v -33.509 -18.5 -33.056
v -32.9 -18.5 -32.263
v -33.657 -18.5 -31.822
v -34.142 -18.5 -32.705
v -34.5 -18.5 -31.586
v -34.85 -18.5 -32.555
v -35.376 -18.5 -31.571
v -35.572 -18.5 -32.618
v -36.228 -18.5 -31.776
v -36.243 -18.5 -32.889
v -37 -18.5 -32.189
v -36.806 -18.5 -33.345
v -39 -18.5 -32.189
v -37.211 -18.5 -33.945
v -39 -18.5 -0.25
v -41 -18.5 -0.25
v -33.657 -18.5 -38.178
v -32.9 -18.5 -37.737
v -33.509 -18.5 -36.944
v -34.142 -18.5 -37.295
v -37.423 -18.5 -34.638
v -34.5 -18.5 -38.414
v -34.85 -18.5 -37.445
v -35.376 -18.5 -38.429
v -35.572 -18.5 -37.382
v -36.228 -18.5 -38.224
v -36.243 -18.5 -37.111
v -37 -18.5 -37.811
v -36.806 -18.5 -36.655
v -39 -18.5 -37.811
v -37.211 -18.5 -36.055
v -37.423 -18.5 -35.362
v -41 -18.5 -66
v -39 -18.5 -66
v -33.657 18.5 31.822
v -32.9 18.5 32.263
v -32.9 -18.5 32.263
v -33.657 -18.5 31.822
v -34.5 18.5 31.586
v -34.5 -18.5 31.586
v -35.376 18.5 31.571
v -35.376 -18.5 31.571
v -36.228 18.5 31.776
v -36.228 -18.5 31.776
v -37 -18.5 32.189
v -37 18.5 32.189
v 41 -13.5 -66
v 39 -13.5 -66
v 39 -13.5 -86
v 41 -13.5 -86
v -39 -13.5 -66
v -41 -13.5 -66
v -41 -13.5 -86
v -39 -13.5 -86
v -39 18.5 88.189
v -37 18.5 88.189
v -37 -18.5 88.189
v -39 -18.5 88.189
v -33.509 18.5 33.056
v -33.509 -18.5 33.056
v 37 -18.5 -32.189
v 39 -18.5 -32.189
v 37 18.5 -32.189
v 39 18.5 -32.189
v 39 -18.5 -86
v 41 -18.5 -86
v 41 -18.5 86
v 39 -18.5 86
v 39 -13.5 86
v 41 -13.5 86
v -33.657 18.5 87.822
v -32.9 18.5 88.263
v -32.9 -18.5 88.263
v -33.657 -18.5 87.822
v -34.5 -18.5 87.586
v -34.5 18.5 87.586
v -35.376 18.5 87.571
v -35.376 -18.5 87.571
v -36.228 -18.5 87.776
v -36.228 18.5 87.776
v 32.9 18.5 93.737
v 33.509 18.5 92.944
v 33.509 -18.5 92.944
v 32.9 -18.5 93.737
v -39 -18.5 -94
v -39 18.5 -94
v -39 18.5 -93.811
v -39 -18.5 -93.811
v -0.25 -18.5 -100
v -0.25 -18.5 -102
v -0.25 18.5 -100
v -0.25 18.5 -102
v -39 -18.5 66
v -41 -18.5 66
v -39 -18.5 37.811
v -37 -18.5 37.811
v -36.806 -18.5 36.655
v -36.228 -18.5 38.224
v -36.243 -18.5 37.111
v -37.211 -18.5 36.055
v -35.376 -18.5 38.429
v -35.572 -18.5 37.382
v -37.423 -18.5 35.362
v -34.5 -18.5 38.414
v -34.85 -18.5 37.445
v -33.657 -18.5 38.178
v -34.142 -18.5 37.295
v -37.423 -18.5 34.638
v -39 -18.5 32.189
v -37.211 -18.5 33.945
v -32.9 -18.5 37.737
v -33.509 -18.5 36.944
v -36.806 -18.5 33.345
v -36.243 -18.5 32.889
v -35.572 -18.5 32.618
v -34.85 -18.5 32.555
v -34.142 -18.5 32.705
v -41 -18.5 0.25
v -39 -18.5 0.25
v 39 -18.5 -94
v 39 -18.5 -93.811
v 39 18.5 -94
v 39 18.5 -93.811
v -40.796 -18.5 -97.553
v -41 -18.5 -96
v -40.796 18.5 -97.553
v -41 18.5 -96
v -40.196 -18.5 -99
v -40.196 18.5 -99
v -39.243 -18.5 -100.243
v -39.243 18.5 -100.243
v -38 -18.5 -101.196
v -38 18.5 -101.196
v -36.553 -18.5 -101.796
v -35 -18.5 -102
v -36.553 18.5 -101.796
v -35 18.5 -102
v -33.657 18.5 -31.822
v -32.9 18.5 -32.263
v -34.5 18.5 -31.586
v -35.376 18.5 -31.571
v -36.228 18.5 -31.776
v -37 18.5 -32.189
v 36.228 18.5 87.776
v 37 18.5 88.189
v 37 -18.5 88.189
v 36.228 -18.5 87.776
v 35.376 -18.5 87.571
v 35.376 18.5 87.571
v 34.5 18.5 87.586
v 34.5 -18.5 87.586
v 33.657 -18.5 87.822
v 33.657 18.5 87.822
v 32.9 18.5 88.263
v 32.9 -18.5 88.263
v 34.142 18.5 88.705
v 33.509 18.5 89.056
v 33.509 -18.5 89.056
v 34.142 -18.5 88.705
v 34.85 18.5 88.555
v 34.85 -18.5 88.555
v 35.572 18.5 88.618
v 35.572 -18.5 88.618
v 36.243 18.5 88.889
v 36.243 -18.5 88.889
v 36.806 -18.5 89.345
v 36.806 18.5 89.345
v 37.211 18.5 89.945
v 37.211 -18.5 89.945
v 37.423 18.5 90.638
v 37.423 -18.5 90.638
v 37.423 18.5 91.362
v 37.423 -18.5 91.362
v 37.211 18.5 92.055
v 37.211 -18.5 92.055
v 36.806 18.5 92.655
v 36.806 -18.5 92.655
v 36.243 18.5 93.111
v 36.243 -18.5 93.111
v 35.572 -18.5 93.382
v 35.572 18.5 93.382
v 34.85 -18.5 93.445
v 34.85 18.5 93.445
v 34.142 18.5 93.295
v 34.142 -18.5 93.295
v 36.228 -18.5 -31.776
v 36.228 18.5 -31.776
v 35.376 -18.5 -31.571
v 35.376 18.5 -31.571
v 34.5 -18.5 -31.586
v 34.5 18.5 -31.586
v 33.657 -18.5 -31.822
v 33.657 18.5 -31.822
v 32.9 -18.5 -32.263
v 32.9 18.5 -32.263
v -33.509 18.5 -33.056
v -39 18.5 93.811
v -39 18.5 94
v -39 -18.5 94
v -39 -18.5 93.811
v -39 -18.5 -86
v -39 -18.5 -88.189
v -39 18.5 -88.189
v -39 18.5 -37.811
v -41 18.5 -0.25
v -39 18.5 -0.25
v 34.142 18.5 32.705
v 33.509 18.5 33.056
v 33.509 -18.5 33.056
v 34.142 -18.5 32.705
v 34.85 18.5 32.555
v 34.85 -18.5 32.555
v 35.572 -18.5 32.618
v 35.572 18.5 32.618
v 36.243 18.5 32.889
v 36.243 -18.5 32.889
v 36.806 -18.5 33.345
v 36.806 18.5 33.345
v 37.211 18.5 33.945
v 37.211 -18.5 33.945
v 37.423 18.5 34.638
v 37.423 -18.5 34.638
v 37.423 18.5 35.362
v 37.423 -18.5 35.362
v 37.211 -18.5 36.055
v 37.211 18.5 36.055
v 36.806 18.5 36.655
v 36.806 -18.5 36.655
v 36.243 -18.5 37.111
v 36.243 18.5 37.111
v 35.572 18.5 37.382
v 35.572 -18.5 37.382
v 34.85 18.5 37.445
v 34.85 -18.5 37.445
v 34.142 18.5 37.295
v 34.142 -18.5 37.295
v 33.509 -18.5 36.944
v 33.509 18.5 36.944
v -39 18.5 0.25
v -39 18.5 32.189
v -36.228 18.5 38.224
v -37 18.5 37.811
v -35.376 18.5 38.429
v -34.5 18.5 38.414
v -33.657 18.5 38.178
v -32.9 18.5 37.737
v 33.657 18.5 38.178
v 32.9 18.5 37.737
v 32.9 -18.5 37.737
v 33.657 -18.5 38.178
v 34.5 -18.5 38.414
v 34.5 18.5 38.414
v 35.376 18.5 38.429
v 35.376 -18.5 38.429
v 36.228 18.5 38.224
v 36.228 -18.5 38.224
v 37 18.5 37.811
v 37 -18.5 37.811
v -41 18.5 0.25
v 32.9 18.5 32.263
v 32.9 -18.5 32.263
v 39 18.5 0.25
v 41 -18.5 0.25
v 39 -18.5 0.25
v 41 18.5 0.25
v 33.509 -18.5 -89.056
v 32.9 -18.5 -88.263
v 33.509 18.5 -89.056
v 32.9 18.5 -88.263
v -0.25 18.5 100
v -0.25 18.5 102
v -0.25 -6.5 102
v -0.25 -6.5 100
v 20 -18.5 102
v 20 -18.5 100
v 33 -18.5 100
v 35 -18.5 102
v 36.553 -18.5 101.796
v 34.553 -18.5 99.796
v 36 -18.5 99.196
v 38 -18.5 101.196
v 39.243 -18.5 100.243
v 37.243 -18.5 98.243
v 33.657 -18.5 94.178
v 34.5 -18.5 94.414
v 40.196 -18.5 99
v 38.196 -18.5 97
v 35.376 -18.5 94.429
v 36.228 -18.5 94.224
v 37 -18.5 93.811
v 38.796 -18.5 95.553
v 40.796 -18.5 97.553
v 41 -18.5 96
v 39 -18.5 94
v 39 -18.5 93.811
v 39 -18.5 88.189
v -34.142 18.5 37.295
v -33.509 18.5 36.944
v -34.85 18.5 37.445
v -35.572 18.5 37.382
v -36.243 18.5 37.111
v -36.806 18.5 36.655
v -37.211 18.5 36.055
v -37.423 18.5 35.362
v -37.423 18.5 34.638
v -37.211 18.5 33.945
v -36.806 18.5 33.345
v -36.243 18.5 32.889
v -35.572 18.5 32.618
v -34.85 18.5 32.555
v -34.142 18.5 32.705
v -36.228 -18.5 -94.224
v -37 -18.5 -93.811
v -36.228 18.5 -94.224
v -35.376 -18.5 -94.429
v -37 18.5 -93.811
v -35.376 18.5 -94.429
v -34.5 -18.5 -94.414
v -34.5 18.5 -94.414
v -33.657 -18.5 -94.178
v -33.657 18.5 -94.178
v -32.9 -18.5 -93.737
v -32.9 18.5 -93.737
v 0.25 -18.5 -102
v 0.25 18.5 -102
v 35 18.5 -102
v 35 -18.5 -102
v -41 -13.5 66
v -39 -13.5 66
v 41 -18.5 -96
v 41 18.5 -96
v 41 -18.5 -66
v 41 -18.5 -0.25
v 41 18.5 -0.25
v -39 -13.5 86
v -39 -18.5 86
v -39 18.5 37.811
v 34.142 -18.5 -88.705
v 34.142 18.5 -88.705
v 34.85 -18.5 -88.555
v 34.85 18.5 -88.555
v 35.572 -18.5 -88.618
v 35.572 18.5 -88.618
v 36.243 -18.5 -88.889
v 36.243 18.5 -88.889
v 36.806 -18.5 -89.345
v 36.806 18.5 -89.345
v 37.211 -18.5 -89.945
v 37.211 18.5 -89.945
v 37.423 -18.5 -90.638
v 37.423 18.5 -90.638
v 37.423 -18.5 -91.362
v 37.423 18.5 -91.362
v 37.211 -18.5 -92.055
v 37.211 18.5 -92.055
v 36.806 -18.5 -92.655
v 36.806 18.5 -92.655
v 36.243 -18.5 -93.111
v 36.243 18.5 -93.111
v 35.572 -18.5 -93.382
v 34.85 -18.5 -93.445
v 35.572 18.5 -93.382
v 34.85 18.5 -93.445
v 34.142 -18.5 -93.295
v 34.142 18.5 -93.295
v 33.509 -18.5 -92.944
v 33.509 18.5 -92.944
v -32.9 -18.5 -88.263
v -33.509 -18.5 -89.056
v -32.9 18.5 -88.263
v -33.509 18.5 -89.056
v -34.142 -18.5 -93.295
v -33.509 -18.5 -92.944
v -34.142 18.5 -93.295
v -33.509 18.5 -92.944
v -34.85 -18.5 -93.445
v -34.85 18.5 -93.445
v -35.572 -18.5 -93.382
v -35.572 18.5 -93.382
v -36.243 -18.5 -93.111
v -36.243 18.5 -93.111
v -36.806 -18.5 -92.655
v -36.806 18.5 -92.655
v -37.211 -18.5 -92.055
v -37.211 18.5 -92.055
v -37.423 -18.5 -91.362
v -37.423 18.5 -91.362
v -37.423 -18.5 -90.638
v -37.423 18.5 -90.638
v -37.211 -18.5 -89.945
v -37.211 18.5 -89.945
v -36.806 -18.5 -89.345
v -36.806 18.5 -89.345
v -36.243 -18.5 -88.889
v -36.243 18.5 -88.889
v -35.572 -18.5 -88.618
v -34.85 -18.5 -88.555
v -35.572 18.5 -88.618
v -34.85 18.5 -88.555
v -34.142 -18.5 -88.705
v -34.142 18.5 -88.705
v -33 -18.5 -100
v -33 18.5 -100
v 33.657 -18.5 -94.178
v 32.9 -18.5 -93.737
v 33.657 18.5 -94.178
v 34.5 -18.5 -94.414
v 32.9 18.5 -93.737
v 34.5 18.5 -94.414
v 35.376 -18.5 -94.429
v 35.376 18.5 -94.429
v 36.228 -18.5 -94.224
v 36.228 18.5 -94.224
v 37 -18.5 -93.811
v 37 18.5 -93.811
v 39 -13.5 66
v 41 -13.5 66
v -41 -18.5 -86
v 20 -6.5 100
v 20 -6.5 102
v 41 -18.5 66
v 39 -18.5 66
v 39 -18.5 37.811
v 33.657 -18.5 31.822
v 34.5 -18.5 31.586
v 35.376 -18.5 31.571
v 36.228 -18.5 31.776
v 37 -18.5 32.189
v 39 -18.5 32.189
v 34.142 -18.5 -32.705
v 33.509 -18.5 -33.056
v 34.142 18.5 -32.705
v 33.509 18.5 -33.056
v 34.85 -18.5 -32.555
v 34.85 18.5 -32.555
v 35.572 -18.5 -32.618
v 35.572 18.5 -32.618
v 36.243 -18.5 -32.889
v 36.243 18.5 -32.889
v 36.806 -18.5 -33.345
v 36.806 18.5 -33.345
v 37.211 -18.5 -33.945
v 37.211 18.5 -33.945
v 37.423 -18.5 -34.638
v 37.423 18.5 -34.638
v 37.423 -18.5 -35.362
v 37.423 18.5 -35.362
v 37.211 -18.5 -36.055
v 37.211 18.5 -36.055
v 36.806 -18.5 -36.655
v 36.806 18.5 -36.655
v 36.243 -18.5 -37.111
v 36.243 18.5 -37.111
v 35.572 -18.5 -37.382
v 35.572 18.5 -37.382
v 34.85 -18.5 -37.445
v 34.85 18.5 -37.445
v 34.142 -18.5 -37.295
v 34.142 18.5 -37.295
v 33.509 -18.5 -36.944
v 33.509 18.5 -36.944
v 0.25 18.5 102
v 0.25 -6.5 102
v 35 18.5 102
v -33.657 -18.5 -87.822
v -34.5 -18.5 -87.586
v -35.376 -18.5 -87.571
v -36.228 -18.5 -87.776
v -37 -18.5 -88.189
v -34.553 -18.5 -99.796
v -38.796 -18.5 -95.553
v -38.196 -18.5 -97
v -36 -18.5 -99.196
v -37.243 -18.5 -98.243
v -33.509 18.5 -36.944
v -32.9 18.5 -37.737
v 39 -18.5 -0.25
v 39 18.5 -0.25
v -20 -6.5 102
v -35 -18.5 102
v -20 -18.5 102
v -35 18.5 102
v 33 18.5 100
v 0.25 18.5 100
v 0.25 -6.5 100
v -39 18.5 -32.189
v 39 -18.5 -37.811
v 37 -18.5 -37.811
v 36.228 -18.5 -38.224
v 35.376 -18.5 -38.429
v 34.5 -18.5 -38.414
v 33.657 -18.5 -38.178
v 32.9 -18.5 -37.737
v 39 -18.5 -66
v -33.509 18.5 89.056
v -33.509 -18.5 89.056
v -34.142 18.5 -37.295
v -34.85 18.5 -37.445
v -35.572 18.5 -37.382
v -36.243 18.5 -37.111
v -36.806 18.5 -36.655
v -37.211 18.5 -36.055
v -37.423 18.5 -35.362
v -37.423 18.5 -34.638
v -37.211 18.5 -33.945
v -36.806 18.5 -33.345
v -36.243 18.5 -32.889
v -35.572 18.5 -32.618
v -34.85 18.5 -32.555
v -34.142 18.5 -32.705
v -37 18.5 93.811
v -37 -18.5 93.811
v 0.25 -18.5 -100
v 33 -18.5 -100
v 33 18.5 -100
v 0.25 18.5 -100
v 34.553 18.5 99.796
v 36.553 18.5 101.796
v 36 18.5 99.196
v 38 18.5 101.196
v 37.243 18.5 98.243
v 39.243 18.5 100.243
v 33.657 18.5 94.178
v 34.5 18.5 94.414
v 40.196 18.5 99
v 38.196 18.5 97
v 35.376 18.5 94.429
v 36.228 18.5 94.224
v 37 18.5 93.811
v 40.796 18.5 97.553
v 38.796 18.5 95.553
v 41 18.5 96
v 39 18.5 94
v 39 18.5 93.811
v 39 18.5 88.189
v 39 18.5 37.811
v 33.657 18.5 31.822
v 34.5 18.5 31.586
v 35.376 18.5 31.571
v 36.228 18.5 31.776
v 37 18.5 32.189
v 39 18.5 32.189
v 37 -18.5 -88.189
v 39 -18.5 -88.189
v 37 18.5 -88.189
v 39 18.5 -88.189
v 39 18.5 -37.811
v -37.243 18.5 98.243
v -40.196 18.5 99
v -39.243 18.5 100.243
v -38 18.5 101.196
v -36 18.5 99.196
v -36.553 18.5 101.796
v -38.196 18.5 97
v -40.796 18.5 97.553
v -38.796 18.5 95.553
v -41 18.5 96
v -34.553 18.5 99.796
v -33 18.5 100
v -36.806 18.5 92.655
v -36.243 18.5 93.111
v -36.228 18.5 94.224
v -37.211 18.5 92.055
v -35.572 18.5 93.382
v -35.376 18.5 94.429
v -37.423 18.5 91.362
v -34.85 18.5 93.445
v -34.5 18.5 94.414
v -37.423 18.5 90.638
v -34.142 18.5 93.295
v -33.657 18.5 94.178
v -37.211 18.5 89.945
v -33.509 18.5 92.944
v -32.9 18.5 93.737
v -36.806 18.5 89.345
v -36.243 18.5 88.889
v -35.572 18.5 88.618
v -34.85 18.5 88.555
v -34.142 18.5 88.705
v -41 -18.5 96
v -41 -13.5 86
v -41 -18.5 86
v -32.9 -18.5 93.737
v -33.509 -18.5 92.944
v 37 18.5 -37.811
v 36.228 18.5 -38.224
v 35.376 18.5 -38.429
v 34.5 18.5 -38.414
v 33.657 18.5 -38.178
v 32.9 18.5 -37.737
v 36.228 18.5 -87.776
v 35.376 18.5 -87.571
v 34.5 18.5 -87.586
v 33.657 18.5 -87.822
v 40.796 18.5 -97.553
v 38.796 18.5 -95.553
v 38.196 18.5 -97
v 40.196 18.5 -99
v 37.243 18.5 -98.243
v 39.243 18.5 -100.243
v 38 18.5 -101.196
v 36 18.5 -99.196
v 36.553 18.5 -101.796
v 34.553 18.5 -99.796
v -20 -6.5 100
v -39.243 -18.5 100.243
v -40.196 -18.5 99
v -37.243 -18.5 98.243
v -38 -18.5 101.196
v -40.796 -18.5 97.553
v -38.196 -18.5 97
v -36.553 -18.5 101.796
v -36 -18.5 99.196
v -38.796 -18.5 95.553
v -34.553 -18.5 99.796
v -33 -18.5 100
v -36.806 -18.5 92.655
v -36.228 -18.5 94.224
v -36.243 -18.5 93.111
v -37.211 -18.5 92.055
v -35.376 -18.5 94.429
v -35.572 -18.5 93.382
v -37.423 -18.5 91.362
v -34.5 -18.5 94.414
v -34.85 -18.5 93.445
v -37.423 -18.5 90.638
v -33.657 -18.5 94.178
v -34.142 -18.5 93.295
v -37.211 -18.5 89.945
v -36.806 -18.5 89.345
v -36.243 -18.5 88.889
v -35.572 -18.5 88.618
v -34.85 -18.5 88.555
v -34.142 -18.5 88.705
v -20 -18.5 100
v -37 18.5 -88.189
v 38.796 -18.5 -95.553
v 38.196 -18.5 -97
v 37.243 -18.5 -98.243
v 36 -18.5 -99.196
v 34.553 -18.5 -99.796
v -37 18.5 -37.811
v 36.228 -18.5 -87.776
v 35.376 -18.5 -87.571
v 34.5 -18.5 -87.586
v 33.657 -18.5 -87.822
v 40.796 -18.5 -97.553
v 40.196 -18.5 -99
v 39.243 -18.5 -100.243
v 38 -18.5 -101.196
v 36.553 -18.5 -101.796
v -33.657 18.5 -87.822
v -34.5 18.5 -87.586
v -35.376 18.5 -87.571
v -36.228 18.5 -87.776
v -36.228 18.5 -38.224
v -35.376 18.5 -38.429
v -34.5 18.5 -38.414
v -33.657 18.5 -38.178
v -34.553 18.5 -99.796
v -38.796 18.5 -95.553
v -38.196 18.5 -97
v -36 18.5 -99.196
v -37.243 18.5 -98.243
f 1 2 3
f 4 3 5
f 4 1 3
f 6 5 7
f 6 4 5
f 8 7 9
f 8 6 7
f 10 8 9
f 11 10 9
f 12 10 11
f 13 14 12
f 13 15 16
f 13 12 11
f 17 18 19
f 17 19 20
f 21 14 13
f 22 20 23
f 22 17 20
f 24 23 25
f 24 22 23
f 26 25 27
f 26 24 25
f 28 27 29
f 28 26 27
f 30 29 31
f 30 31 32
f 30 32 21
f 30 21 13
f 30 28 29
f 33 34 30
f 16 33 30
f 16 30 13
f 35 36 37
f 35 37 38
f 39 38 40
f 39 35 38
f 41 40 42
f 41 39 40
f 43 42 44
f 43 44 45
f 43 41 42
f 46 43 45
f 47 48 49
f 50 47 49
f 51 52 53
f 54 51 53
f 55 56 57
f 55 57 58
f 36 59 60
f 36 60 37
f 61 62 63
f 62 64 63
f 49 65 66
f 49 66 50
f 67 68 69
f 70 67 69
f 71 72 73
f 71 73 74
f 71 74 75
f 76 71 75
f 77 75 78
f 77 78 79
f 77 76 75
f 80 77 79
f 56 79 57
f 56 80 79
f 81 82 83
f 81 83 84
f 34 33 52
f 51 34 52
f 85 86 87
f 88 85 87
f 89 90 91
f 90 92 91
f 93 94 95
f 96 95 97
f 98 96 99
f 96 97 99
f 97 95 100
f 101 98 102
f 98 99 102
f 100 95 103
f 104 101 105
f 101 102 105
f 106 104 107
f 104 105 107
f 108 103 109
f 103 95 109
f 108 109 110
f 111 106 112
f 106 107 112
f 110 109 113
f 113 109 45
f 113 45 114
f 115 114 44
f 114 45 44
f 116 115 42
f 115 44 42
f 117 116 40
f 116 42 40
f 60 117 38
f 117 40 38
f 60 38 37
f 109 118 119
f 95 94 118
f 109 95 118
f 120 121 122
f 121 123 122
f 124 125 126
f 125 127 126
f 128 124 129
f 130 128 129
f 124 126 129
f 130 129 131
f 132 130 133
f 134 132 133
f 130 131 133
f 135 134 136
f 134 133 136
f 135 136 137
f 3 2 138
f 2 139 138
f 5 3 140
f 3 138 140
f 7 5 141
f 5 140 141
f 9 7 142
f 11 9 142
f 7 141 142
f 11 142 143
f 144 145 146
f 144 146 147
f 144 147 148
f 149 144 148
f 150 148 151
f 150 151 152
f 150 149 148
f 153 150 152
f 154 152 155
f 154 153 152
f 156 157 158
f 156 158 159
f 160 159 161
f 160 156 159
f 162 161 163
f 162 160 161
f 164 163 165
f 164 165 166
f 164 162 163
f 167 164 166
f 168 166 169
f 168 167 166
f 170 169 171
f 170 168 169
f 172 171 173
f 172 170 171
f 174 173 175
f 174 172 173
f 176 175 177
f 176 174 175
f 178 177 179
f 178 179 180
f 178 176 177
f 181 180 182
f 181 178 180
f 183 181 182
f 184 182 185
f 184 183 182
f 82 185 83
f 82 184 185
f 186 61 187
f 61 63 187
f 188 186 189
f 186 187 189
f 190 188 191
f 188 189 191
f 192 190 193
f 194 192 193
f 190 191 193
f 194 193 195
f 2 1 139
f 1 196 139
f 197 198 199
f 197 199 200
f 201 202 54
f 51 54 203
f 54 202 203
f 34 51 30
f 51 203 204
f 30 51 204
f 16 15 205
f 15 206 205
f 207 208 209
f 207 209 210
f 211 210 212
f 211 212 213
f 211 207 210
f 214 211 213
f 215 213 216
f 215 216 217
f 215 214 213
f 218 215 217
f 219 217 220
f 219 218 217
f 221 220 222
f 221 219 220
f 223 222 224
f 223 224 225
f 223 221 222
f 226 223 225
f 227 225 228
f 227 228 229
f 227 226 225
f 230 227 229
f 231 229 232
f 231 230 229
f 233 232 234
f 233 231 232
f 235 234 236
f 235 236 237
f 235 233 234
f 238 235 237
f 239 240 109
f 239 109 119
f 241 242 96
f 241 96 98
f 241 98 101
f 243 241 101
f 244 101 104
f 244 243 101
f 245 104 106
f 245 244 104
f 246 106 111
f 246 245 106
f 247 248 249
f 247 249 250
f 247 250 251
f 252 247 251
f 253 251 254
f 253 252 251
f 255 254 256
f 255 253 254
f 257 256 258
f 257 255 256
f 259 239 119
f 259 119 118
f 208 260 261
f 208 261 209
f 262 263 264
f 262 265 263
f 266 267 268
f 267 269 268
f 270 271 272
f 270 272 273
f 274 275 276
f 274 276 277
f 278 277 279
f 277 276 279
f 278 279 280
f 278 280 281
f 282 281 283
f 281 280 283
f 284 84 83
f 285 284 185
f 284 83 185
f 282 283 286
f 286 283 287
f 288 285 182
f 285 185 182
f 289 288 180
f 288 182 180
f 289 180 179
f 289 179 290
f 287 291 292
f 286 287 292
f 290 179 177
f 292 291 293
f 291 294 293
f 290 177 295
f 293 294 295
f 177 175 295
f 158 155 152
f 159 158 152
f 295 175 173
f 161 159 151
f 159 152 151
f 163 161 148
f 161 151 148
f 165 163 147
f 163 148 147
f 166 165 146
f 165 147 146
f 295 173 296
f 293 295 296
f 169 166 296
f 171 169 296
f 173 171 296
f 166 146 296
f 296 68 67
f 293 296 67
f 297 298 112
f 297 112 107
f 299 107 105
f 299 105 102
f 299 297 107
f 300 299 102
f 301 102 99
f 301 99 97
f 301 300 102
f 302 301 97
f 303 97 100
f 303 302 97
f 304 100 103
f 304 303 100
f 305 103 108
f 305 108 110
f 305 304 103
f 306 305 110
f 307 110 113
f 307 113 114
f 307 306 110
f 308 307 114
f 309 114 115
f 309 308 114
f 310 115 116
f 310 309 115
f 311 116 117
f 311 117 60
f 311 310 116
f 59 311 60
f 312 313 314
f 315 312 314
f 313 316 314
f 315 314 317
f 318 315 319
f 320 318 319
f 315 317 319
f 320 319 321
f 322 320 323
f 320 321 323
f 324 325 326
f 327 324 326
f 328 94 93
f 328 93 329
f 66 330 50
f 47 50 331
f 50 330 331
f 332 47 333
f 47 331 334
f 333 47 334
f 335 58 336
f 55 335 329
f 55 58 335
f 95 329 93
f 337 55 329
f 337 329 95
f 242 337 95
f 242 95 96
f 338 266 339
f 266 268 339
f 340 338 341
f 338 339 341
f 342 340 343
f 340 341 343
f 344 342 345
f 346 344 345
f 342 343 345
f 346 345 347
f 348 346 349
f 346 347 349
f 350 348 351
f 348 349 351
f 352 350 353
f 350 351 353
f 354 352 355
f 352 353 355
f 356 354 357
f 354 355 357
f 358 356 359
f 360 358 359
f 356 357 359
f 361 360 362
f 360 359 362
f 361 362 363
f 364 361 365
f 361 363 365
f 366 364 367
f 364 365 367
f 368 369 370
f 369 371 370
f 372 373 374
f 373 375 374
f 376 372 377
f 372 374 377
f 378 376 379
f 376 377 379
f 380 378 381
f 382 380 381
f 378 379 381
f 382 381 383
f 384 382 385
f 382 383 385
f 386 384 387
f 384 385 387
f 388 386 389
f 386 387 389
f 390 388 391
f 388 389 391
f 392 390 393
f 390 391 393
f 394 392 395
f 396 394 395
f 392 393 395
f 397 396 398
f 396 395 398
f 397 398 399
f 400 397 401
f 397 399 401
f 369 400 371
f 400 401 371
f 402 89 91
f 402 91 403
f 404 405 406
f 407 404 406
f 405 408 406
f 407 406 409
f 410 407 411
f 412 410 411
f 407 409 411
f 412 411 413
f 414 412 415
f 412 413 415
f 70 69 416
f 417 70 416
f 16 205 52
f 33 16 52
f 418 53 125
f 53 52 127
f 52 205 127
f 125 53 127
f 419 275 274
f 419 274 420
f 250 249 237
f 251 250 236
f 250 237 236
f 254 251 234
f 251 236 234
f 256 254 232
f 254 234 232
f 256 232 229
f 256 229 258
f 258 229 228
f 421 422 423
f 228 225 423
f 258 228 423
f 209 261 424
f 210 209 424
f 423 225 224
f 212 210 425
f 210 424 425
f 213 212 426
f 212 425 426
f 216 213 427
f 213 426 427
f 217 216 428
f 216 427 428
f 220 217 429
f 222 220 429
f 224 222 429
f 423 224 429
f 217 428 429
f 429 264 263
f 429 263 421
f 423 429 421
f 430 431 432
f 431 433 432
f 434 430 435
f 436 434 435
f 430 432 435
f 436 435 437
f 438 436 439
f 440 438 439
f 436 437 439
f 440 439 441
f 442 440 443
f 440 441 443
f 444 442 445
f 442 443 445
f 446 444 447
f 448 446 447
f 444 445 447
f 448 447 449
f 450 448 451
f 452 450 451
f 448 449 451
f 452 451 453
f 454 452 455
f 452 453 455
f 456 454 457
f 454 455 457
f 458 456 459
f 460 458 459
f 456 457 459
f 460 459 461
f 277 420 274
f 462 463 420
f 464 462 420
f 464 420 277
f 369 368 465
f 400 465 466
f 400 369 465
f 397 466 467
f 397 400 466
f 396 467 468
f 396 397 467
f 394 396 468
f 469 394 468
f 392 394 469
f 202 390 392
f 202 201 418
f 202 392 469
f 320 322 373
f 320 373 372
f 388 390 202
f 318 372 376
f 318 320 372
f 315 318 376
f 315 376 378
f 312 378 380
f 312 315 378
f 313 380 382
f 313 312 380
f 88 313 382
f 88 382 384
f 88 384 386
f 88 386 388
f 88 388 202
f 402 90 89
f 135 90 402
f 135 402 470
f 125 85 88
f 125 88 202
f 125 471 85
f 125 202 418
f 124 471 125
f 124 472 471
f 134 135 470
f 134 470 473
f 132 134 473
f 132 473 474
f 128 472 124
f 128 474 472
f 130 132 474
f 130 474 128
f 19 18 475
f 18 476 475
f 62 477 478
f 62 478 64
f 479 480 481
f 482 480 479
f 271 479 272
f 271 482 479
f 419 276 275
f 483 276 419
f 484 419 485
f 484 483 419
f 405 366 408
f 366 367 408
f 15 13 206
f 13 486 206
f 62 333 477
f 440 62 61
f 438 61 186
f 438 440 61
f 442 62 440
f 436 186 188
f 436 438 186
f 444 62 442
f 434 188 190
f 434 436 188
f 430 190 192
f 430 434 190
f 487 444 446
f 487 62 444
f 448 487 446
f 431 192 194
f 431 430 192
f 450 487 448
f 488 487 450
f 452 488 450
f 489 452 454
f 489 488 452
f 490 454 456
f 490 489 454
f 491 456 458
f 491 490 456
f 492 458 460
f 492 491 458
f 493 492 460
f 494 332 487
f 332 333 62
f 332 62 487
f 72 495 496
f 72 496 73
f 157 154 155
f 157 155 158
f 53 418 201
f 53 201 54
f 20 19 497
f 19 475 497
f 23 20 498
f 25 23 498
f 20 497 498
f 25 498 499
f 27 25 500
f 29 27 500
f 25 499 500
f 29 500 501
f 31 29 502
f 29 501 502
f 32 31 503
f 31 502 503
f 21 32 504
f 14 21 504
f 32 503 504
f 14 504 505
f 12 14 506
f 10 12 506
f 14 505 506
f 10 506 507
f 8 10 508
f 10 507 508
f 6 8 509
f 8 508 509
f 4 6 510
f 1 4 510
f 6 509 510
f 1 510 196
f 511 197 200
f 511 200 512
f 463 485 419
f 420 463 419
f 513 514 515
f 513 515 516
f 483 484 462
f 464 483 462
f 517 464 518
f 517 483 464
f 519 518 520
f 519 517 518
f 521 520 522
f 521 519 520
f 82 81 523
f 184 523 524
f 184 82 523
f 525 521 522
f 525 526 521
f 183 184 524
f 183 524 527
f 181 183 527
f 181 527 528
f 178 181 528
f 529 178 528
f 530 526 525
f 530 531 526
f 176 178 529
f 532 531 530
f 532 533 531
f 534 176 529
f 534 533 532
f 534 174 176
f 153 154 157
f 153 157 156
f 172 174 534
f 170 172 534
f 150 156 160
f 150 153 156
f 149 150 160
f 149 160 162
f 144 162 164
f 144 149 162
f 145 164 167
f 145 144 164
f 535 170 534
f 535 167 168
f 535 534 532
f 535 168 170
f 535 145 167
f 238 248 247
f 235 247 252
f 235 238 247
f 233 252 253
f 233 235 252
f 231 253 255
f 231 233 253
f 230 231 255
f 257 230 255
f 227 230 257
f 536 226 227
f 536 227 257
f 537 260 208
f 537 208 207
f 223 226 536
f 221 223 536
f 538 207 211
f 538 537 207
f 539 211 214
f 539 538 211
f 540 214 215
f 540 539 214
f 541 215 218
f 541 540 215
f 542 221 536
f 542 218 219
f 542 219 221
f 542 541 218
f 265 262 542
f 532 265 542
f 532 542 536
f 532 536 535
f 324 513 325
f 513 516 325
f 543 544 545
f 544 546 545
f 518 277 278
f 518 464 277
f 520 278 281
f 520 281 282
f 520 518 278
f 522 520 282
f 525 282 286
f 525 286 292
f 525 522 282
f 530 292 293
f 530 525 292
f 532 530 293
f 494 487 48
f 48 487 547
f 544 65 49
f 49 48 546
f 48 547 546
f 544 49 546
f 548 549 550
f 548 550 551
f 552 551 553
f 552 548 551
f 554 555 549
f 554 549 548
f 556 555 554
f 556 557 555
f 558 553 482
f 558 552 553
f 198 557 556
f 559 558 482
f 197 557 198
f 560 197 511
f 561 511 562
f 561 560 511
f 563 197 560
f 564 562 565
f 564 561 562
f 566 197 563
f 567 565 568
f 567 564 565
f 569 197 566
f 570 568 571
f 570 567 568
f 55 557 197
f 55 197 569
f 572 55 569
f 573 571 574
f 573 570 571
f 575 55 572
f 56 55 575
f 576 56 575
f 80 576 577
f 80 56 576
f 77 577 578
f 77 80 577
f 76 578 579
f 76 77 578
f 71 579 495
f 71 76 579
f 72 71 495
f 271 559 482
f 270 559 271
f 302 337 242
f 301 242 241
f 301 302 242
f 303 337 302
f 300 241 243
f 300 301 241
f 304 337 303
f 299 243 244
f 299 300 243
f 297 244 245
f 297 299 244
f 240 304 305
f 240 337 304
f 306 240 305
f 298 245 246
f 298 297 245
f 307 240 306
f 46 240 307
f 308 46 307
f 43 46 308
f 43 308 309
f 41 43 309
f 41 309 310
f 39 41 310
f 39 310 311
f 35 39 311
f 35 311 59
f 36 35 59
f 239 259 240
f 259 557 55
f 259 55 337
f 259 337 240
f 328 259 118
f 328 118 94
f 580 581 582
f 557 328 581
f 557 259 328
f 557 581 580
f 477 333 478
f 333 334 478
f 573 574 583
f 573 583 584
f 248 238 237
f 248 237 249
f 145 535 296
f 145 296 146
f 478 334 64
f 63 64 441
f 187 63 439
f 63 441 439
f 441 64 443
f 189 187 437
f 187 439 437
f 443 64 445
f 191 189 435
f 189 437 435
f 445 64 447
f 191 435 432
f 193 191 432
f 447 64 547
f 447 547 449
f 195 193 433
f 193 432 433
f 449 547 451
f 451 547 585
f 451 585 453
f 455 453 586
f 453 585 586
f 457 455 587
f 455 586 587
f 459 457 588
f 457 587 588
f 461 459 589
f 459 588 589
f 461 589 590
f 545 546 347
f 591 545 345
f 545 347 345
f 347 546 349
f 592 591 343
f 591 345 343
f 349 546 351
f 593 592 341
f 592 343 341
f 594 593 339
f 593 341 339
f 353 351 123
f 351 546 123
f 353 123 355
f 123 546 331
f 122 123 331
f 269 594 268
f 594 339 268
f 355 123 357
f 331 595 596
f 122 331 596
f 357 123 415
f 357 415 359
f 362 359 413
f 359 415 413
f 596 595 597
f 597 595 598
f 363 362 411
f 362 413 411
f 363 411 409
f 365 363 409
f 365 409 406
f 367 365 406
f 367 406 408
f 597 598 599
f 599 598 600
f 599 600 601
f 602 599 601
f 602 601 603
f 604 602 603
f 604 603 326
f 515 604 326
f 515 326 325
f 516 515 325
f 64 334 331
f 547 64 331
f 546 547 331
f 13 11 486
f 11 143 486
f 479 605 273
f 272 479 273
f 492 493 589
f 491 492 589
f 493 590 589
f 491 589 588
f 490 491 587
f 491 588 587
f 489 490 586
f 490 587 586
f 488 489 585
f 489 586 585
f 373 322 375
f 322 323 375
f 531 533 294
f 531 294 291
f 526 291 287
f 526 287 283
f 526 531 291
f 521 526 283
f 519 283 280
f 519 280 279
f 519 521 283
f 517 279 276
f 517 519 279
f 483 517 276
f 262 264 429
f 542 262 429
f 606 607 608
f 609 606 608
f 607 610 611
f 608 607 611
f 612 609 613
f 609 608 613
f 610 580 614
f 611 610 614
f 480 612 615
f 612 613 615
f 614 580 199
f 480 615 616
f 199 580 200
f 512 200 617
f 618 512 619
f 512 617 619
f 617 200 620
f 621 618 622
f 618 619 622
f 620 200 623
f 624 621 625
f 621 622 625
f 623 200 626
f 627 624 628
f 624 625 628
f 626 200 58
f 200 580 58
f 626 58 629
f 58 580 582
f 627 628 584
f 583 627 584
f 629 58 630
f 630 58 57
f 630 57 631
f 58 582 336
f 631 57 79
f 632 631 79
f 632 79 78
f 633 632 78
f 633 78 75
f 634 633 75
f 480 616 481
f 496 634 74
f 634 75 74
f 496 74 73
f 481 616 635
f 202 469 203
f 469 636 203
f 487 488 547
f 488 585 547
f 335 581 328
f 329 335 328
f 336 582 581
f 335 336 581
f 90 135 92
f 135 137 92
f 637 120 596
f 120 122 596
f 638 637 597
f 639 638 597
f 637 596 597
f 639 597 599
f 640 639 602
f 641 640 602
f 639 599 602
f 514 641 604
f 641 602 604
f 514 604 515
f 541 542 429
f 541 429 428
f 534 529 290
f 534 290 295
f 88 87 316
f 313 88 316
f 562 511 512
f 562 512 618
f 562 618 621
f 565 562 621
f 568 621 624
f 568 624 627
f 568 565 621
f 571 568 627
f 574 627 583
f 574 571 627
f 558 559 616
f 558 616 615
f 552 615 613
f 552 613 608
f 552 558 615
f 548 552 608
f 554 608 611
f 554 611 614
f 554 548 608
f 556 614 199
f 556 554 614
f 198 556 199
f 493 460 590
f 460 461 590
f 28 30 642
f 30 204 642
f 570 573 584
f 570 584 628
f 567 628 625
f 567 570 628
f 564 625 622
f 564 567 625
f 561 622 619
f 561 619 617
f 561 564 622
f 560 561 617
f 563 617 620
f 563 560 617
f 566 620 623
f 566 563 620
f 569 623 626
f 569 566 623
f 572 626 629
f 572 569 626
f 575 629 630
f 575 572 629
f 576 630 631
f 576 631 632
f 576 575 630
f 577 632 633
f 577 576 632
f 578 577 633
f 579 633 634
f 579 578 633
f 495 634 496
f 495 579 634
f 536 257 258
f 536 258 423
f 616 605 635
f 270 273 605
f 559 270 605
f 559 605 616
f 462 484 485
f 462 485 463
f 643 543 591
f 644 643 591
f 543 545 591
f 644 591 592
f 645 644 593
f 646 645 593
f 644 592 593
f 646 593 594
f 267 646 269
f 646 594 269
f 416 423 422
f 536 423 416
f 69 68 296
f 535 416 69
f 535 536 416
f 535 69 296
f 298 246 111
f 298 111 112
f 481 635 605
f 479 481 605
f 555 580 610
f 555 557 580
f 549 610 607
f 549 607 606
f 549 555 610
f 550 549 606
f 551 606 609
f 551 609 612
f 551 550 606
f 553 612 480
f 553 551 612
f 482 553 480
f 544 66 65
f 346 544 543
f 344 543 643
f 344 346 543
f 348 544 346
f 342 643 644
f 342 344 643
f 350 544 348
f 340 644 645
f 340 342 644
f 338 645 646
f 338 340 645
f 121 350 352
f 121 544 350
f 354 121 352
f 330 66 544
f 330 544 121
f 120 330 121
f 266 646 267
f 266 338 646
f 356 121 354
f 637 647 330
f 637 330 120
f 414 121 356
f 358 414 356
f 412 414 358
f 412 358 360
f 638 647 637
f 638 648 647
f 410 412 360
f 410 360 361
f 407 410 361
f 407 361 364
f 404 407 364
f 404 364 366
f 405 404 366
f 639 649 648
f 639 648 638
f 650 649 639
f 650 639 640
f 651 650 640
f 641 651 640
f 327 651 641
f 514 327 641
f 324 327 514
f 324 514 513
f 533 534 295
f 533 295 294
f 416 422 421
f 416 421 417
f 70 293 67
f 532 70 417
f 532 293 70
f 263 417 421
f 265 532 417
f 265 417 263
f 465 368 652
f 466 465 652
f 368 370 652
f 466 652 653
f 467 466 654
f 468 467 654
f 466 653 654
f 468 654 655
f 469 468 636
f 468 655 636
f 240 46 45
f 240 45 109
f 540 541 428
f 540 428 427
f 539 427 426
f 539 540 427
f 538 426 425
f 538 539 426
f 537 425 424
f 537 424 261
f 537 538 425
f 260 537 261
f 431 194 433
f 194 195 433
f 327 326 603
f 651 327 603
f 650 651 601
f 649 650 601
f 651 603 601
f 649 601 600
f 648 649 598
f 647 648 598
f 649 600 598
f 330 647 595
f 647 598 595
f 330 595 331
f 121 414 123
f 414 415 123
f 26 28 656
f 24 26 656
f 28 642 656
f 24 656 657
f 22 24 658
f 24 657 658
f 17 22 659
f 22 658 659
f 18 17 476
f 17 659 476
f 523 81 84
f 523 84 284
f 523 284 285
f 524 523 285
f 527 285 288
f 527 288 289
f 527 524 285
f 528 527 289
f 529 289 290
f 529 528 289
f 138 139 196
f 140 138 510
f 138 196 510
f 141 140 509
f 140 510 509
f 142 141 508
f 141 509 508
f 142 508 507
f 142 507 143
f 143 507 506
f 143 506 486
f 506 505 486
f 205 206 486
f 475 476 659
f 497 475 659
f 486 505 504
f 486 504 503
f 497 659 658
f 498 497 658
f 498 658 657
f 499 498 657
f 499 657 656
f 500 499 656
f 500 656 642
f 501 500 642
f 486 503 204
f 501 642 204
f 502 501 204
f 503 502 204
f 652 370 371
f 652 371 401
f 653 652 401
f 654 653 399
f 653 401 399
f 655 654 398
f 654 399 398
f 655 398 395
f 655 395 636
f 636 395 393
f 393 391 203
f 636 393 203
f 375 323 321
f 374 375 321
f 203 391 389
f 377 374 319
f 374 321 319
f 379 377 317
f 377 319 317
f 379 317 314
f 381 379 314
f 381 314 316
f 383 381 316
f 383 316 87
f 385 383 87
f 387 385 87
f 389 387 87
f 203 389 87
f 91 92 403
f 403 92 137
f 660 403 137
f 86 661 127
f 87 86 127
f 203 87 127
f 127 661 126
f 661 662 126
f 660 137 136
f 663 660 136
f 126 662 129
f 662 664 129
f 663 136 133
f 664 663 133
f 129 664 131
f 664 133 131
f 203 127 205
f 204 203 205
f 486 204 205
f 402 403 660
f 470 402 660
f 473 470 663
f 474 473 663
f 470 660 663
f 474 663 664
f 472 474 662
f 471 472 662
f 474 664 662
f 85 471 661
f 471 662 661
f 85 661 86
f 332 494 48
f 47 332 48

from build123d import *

# Parameters (mm, degrees)
EXTRUDE_2_DEPTH          = 18.5
EXTRUDE_2_2_DEPTH        = 18.5
EXTRUDE_2_3_DEPTH        = 18.5
EXTRUDE_2_4_DEPTH        = 18.5
CUT_EXTRUDE_START        = 100
SKETCH_3_W               = 40
SKETCH_3_H               = 12
CUT_EXTRUDE_2_DEPTH      = 12.477576221
CUT_EXTRUDE_3_DEPTH      = 112.477576221
CUT_EXTRUDE_3_DEPTH_BACK = 112.477576221
SKETCH_4_W               = 20
SKETCH_4_H               = 5


with BuildPart() as part:
    # Эскиз1 → Бобышка-Вытянуть2 (new, symmetric)
    with BuildSketch(Plane(origin=(0, 0, 0), x_dir=(1, 0, 0), z_dir=(0, 1, 0))):
        with BuildLine():
            Line((-39, 93.811138559), (-37, 93.811138559))
            ThreePointArc((-37, 93.811138559), (-34.937686812, 94.44943721), (-32.89977307, 93.737069024))
            Line((-32.89977307, 93.737069024), (-33.508534499, 92.943715684))
            ThreePointArc((-33.508534499, 92.943715684), (-37.45, 91), (-33.508534499, 89.056284316))
            Line((-33.508534499, 89.056284316), (-32.89977307, 88.262930976))
            ThreePointArc((-32.89977307, 88.262930976), (-34.937686812, 87.55056279), (-37, 88.188861441))
            Line((-37, 88.188861441), (-39, 88.188861441))
            Line((-39, 88.188861441), (-39, 37.811138559))
            Line((-39, 37.811138559), (-37, 37.811138559))
            ThreePointArc((-37, 37.811138559), (-34.937686812, 38.44943721), (-32.89977307, 37.737069024))
            Line((-32.89977307, 37.737069024), (-33.508534499, 36.943715684))
            ThreePointArc((-33.508534499, 36.943715684), (-37.45, 35), (-33.508534499, 33.056284316))
            Line((-33.508534499, 33.056284316), (-32.89977307, 32.262930976))
            ThreePointArc((-32.89977307, 32.262930976), (-34.937686812, 31.55056279), (-37, 32.188861441))
            Line((-37, 32.188861441), (-39, 32.188861441))
            Line((-39, 32.188861441), (-39, 0.25))
            Line((-39, 0.25), (-41, 0.25))
            Line((-41, 0.25), (-41, 96))
            ThreePointArc((-41, 96), (-39.242640687, 100.242640687), (-35, 102))
            Line((-35, 102), (-0.25, 102))
            Line((-0.25, 102), (-0.25, 100))
            Line((-0.25, 100), (-33, 100))
            ThreePointArc((-33, 100), (-37.242640687, 98.242640687), (-39, 94))
            Line((-39, 94), (-39, 93.811138559))
        make_face()
    extrude(amount=EXTRUDE_2_DEPTH, both=True)


with BuildPart() as body_2:
    # Эскиз1 → Extrude 2 2 (new, symmetric)
    with BuildSketch(Plane(origin=(0, 0, 0), x_dir=(1, 0, 0), z_dir=(0, 1, 0))):
        with BuildLine():
            Line((-35, -102), (-0.25, -102))
            Line((-0.25, -102), (-0.25, -100))
            Line((-0.25, -100), (-33, -100))
            ThreePointArc((-33, -100), (-37.242640687, -98.242640687), (-39, -94))
            Line((-39, -94), (-39, -93.811138559))
            Line((-39, -93.811138559), (-37, -93.811138559))
            ThreePointArc((-37, -93.811138559), (-34.937686812, -94.44943721), (-32.89977307, -93.737069024))
            Line((-32.89977307, -93.737069024), (-33.508534499, -92.943715684))
            ThreePointArc((-33.508534499, -92.943715684), (-37.45, -91), (-33.508534499, -89.056284316))
            Line((-33.508534499, -89.056284316), (-32.89977307, -88.262930976))
            ThreePointArc((-32.89977307, -88.262930976), (-34.937686812, -87.55056279), (-37, -88.188861441))
            Line((-37, -88.188861441), (-39, -88.188861441))
            Line((-39, -88.188861441), (-39, -37.811138559))
            Line((-39, -37.811138559), (-37, -37.811138559))
            ThreePointArc((-37, -37.811138559), (-34.937686812, -38.44943721), (-32.89977307, -37.737069024))
            Line((-32.89977307, -37.737069024), (-33.508534499, -36.943715684))
            ThreePointArc((-33.508534499, -36.943715684), (-37.45, -35), (-33.508534499, -33.056284316))
            Line((-33.508534499, -33.056284316), (-32.89977307, -32.262930976))
            ThreePointArc((-32.89977307, -32.262930976), (-34.937686812, -31.55056279), (-37, -32.188861441))
            Line((-37, -32.188861441), (-39, -32.188861441))
            Line((-39, -32.188861441), (-39, -0.25))
            Line((-39, -0.25), (-41, -0.25))
            Line((-41, -0.25), (-41, -96))
            ThreePointArc((-41, -96), (-39.242640687, -100.242640687), (-35, -102))
        make_face()
    extrude(amount=EXTRUDE_2_2_DEPTH, both=True)


with BuildPart() as body_3:
    # Эскиз1 → Extrude 2 3 (new, symmetric)
    with BuildSketch(Plane(origin=(0, 0, 0), x_dir=(1, 0, 0), z_dir=(0, 1, 0))):
        with BuildLine():
            Line((41, 96), (41, 0.25))
            Line((41, 0.25), (39, 0.25))
            Line((39, 0.25), (39, 32.188861441))
            Line((39, 32.188861441), (37, 32.188861441))
            ThreePointArc((37, 32.188861441), (34.937686812, 31.55056279), (32.89977307, 32.262930976))
            Line((32.89977307, 32.262930976), (33.508534499, 33.056284316))
            ThreePointArc((33.508534499, 33.056284316), (37.45, 35), (33.508534499, 36.943715684))
            Line((33.508534499, 36.943715684), (32.89977307, 37.737069024))
            ThreePointArc((32.89977307, 37.737069024), (34.937686812, 38.44943721), (37, 37.811138559))
            Line((37, 37.811138559), (39, 37.811138559))
            Line((39, 37.811138559), (39, 88.188861441))
            Line((39, 88.188861441), (37, 88.188861441))
            ThreePointArc((37, 88.188861441), (34.937686812, 87.55056279), (32.89977307, 88.262930976))
            Line((32.89977307, 88.262930976), (33.508534499, 89.056284316))
            ThreePointArc((33.508534499, 89.056284316), (37.45, 91), (33.508534499, 92.943715684))
            Line((33.508534499, 92.943715684), (32.89977307, 93.737069024))
            ThreePointArc((32.89977307, 93.737069024), (34.937686812, 94.44943721), (37, 93.811138559))
            Line((37, 93.811138559), (39, 93.811138559))
            Line((39, 93.811138559), (39, 94))
            ThreePointArc((39, 94), (37.242640687, 98.242640687), (33, 100))
            Line((33, 100), (0.25, 100))
            Line((0.25, 100), (0.25, 102))
            Line((0.25, 102), (35, 102))
            ThreePointArc((35, 102), (39.242640687, 100.242640687), (41, 96))
        make_face()
    extrude(amount=EXTRUDE_2_3_DEPTH, both=True)


with BuildPart() as body_4:
    # Эскиз1 → Extrude 2 4 (new, symmetric)
    with BuildSketch(Plane(origin=(0, 0, 0), x_dir=(1, 0, 0), z_dir=(0, 1, 0))):
        with BuildLine():
            Line((41, -0.25), (39, -0.25))
            Line((39, -0.25), (39, -32.188861441))
            Line((39, -32.188861441), (37, -32.188861441))
            ThreePointArc((37, -32.188861441), (34.937686812, -31.55056279), (32.89977307, -32.262930976))
            Line((32.89977307, -32.262930976), (33.508534499, -33.056284316))
            ThreePointArc((33.508534499, -33.056284316), (37.45, -35), (33.508534499, -36.943715684))
            Line((33.508534499, -36.943715684), (32.89977307, -37.737069024))
            ThreePointArc((32.89977307, -37.737069024), (34.937686812, -38.44943721), (37, -37.811138559))
            Line((37, -37.811138559), (39, -37.811138559))
            Line((39, -37.811138559), (39, -88.188861441))
            Line((39, -88.188861441), (37, -88.188861441))
            ThreePointArc((37, -88.188861441), (34.937686812, -87.55056279), (32.89977307, -88.262930976))
            Line((32.89977307, -88.262930976), (33.508534499, -89.056284316))
            ThreePointArc((33.508534499, -89.056284316), (37.45, -91), (33.508534499, -92.943715684))
            Line((33.508534499, -92.943715684), (32.89977307, -93.737069024))
            ThreePointArc((32.89977307, -93.737069024), (34.937686812, -94.44943721), (37, -93.811138559))
            Line((37, -93.811138559), (39, -93.811138559))
            Line((39, -93.811138559), (39, -94))
            ThreePointArc((39, -94), (37.242640687, -98.242640687), (33, -100))
            Line((33, -100), (0.25, -100))
            Line((0.25, -100), (0.25, -102))
            Line((0.25, -102), (35, -102))
            ThreePointArc((35, -102), (39.242640687, -100.242640687), (41, -96))
            Line((41, -96), (41, -0.25))
        make_face()
    extrude(amount=EXTRUDE_2_4_DEPTH, both=True)


with BuildPart() as cut_extrude_2_tool:
    # Эскиз3 → Вырез-Вытянуть2 (new, through all)
    with BuildSketch(Plane.XY.offset(CUT_EXTRUDE_START)):
        with Locations((0, -12.5)):
            Rectangle(SKETCH_3_W, SKETCH_3_H)
    extrude(amount=CUT_EXTRUDE_2_DEPTH)


with BuildPart() as body_2_1:
    add(body_2.part)

    # Вырез-Вытянуть2: cut by cut_extrude_2_tool
    add(cut_extrude_2_tool.part, mode=Mode.SUBTRACT)


with BuildPart() as body_4_1:
    add(body_4.part)

    # Вырез-Вытянуть2: cut by cut_extrude_2_tool
    add(cut_extrude_2_tool.part, mode=Mode.SUBTRACT)


with BuildPart() as cut_extrude_3_tool:
    # Эскиз4 → Вырез-Вытянуть3 (new, two sides: drawn at the far end of the back side and taken through both)
    with BuildSketch(Plane(origin=(0, 0, 0), x_dir=(0, 0, -1), z_dir=(1, 0, 0)).offset(-CUT_EXTRUDE_3_DEPTH_BACK)):
        with Locations((-76, -16)):
            Rectangle(SKETCH_4_W, SKETCH_4_H)
        with Locations((76, -16)):
            Rectangle(SKETCH_4_W, SKETCH_4_H)
    extrude(amount=CUT_EXTRUDE_3_DEPTH + CUT_EXTRUDE_3_DEPTH_BACK)


with BuildPart() as part_1:
    add(part.part)

    # Вырез-Вытянуть3: cut by cut_extrude_3_tool
    add(cut_extrude_3_tool.part, mode=Mode.SUBTRACT)


with BuildPart() as body_2_2:
    add(body_2_1.part)

    # Вырез-Вытянуть3: cut by cut_extrude_3_tool
    add(cut_extrude_3_tool.part, mode=Mode.SUBTRACT)


with BuildPart() as body_3_1:
    add(body_3.part)

    # Вырез-Вытянуть3: cut by cut_extrude_3_tool
    add(cut_extrude_3_tool.part, mode=Mode.SUBTRACT)


with BuildPart() as body_4_2:
    add(body_4_1.part)

    # Вырез-Вытянуть3: cut by cut_extrude_3_tool
    add(cut_extrude_3_tool.part, mode=Mode.SUBTRACT)


solid = Compound([part_1.part, body_2_2.part, body_3_1.part, body_4_2.part])
